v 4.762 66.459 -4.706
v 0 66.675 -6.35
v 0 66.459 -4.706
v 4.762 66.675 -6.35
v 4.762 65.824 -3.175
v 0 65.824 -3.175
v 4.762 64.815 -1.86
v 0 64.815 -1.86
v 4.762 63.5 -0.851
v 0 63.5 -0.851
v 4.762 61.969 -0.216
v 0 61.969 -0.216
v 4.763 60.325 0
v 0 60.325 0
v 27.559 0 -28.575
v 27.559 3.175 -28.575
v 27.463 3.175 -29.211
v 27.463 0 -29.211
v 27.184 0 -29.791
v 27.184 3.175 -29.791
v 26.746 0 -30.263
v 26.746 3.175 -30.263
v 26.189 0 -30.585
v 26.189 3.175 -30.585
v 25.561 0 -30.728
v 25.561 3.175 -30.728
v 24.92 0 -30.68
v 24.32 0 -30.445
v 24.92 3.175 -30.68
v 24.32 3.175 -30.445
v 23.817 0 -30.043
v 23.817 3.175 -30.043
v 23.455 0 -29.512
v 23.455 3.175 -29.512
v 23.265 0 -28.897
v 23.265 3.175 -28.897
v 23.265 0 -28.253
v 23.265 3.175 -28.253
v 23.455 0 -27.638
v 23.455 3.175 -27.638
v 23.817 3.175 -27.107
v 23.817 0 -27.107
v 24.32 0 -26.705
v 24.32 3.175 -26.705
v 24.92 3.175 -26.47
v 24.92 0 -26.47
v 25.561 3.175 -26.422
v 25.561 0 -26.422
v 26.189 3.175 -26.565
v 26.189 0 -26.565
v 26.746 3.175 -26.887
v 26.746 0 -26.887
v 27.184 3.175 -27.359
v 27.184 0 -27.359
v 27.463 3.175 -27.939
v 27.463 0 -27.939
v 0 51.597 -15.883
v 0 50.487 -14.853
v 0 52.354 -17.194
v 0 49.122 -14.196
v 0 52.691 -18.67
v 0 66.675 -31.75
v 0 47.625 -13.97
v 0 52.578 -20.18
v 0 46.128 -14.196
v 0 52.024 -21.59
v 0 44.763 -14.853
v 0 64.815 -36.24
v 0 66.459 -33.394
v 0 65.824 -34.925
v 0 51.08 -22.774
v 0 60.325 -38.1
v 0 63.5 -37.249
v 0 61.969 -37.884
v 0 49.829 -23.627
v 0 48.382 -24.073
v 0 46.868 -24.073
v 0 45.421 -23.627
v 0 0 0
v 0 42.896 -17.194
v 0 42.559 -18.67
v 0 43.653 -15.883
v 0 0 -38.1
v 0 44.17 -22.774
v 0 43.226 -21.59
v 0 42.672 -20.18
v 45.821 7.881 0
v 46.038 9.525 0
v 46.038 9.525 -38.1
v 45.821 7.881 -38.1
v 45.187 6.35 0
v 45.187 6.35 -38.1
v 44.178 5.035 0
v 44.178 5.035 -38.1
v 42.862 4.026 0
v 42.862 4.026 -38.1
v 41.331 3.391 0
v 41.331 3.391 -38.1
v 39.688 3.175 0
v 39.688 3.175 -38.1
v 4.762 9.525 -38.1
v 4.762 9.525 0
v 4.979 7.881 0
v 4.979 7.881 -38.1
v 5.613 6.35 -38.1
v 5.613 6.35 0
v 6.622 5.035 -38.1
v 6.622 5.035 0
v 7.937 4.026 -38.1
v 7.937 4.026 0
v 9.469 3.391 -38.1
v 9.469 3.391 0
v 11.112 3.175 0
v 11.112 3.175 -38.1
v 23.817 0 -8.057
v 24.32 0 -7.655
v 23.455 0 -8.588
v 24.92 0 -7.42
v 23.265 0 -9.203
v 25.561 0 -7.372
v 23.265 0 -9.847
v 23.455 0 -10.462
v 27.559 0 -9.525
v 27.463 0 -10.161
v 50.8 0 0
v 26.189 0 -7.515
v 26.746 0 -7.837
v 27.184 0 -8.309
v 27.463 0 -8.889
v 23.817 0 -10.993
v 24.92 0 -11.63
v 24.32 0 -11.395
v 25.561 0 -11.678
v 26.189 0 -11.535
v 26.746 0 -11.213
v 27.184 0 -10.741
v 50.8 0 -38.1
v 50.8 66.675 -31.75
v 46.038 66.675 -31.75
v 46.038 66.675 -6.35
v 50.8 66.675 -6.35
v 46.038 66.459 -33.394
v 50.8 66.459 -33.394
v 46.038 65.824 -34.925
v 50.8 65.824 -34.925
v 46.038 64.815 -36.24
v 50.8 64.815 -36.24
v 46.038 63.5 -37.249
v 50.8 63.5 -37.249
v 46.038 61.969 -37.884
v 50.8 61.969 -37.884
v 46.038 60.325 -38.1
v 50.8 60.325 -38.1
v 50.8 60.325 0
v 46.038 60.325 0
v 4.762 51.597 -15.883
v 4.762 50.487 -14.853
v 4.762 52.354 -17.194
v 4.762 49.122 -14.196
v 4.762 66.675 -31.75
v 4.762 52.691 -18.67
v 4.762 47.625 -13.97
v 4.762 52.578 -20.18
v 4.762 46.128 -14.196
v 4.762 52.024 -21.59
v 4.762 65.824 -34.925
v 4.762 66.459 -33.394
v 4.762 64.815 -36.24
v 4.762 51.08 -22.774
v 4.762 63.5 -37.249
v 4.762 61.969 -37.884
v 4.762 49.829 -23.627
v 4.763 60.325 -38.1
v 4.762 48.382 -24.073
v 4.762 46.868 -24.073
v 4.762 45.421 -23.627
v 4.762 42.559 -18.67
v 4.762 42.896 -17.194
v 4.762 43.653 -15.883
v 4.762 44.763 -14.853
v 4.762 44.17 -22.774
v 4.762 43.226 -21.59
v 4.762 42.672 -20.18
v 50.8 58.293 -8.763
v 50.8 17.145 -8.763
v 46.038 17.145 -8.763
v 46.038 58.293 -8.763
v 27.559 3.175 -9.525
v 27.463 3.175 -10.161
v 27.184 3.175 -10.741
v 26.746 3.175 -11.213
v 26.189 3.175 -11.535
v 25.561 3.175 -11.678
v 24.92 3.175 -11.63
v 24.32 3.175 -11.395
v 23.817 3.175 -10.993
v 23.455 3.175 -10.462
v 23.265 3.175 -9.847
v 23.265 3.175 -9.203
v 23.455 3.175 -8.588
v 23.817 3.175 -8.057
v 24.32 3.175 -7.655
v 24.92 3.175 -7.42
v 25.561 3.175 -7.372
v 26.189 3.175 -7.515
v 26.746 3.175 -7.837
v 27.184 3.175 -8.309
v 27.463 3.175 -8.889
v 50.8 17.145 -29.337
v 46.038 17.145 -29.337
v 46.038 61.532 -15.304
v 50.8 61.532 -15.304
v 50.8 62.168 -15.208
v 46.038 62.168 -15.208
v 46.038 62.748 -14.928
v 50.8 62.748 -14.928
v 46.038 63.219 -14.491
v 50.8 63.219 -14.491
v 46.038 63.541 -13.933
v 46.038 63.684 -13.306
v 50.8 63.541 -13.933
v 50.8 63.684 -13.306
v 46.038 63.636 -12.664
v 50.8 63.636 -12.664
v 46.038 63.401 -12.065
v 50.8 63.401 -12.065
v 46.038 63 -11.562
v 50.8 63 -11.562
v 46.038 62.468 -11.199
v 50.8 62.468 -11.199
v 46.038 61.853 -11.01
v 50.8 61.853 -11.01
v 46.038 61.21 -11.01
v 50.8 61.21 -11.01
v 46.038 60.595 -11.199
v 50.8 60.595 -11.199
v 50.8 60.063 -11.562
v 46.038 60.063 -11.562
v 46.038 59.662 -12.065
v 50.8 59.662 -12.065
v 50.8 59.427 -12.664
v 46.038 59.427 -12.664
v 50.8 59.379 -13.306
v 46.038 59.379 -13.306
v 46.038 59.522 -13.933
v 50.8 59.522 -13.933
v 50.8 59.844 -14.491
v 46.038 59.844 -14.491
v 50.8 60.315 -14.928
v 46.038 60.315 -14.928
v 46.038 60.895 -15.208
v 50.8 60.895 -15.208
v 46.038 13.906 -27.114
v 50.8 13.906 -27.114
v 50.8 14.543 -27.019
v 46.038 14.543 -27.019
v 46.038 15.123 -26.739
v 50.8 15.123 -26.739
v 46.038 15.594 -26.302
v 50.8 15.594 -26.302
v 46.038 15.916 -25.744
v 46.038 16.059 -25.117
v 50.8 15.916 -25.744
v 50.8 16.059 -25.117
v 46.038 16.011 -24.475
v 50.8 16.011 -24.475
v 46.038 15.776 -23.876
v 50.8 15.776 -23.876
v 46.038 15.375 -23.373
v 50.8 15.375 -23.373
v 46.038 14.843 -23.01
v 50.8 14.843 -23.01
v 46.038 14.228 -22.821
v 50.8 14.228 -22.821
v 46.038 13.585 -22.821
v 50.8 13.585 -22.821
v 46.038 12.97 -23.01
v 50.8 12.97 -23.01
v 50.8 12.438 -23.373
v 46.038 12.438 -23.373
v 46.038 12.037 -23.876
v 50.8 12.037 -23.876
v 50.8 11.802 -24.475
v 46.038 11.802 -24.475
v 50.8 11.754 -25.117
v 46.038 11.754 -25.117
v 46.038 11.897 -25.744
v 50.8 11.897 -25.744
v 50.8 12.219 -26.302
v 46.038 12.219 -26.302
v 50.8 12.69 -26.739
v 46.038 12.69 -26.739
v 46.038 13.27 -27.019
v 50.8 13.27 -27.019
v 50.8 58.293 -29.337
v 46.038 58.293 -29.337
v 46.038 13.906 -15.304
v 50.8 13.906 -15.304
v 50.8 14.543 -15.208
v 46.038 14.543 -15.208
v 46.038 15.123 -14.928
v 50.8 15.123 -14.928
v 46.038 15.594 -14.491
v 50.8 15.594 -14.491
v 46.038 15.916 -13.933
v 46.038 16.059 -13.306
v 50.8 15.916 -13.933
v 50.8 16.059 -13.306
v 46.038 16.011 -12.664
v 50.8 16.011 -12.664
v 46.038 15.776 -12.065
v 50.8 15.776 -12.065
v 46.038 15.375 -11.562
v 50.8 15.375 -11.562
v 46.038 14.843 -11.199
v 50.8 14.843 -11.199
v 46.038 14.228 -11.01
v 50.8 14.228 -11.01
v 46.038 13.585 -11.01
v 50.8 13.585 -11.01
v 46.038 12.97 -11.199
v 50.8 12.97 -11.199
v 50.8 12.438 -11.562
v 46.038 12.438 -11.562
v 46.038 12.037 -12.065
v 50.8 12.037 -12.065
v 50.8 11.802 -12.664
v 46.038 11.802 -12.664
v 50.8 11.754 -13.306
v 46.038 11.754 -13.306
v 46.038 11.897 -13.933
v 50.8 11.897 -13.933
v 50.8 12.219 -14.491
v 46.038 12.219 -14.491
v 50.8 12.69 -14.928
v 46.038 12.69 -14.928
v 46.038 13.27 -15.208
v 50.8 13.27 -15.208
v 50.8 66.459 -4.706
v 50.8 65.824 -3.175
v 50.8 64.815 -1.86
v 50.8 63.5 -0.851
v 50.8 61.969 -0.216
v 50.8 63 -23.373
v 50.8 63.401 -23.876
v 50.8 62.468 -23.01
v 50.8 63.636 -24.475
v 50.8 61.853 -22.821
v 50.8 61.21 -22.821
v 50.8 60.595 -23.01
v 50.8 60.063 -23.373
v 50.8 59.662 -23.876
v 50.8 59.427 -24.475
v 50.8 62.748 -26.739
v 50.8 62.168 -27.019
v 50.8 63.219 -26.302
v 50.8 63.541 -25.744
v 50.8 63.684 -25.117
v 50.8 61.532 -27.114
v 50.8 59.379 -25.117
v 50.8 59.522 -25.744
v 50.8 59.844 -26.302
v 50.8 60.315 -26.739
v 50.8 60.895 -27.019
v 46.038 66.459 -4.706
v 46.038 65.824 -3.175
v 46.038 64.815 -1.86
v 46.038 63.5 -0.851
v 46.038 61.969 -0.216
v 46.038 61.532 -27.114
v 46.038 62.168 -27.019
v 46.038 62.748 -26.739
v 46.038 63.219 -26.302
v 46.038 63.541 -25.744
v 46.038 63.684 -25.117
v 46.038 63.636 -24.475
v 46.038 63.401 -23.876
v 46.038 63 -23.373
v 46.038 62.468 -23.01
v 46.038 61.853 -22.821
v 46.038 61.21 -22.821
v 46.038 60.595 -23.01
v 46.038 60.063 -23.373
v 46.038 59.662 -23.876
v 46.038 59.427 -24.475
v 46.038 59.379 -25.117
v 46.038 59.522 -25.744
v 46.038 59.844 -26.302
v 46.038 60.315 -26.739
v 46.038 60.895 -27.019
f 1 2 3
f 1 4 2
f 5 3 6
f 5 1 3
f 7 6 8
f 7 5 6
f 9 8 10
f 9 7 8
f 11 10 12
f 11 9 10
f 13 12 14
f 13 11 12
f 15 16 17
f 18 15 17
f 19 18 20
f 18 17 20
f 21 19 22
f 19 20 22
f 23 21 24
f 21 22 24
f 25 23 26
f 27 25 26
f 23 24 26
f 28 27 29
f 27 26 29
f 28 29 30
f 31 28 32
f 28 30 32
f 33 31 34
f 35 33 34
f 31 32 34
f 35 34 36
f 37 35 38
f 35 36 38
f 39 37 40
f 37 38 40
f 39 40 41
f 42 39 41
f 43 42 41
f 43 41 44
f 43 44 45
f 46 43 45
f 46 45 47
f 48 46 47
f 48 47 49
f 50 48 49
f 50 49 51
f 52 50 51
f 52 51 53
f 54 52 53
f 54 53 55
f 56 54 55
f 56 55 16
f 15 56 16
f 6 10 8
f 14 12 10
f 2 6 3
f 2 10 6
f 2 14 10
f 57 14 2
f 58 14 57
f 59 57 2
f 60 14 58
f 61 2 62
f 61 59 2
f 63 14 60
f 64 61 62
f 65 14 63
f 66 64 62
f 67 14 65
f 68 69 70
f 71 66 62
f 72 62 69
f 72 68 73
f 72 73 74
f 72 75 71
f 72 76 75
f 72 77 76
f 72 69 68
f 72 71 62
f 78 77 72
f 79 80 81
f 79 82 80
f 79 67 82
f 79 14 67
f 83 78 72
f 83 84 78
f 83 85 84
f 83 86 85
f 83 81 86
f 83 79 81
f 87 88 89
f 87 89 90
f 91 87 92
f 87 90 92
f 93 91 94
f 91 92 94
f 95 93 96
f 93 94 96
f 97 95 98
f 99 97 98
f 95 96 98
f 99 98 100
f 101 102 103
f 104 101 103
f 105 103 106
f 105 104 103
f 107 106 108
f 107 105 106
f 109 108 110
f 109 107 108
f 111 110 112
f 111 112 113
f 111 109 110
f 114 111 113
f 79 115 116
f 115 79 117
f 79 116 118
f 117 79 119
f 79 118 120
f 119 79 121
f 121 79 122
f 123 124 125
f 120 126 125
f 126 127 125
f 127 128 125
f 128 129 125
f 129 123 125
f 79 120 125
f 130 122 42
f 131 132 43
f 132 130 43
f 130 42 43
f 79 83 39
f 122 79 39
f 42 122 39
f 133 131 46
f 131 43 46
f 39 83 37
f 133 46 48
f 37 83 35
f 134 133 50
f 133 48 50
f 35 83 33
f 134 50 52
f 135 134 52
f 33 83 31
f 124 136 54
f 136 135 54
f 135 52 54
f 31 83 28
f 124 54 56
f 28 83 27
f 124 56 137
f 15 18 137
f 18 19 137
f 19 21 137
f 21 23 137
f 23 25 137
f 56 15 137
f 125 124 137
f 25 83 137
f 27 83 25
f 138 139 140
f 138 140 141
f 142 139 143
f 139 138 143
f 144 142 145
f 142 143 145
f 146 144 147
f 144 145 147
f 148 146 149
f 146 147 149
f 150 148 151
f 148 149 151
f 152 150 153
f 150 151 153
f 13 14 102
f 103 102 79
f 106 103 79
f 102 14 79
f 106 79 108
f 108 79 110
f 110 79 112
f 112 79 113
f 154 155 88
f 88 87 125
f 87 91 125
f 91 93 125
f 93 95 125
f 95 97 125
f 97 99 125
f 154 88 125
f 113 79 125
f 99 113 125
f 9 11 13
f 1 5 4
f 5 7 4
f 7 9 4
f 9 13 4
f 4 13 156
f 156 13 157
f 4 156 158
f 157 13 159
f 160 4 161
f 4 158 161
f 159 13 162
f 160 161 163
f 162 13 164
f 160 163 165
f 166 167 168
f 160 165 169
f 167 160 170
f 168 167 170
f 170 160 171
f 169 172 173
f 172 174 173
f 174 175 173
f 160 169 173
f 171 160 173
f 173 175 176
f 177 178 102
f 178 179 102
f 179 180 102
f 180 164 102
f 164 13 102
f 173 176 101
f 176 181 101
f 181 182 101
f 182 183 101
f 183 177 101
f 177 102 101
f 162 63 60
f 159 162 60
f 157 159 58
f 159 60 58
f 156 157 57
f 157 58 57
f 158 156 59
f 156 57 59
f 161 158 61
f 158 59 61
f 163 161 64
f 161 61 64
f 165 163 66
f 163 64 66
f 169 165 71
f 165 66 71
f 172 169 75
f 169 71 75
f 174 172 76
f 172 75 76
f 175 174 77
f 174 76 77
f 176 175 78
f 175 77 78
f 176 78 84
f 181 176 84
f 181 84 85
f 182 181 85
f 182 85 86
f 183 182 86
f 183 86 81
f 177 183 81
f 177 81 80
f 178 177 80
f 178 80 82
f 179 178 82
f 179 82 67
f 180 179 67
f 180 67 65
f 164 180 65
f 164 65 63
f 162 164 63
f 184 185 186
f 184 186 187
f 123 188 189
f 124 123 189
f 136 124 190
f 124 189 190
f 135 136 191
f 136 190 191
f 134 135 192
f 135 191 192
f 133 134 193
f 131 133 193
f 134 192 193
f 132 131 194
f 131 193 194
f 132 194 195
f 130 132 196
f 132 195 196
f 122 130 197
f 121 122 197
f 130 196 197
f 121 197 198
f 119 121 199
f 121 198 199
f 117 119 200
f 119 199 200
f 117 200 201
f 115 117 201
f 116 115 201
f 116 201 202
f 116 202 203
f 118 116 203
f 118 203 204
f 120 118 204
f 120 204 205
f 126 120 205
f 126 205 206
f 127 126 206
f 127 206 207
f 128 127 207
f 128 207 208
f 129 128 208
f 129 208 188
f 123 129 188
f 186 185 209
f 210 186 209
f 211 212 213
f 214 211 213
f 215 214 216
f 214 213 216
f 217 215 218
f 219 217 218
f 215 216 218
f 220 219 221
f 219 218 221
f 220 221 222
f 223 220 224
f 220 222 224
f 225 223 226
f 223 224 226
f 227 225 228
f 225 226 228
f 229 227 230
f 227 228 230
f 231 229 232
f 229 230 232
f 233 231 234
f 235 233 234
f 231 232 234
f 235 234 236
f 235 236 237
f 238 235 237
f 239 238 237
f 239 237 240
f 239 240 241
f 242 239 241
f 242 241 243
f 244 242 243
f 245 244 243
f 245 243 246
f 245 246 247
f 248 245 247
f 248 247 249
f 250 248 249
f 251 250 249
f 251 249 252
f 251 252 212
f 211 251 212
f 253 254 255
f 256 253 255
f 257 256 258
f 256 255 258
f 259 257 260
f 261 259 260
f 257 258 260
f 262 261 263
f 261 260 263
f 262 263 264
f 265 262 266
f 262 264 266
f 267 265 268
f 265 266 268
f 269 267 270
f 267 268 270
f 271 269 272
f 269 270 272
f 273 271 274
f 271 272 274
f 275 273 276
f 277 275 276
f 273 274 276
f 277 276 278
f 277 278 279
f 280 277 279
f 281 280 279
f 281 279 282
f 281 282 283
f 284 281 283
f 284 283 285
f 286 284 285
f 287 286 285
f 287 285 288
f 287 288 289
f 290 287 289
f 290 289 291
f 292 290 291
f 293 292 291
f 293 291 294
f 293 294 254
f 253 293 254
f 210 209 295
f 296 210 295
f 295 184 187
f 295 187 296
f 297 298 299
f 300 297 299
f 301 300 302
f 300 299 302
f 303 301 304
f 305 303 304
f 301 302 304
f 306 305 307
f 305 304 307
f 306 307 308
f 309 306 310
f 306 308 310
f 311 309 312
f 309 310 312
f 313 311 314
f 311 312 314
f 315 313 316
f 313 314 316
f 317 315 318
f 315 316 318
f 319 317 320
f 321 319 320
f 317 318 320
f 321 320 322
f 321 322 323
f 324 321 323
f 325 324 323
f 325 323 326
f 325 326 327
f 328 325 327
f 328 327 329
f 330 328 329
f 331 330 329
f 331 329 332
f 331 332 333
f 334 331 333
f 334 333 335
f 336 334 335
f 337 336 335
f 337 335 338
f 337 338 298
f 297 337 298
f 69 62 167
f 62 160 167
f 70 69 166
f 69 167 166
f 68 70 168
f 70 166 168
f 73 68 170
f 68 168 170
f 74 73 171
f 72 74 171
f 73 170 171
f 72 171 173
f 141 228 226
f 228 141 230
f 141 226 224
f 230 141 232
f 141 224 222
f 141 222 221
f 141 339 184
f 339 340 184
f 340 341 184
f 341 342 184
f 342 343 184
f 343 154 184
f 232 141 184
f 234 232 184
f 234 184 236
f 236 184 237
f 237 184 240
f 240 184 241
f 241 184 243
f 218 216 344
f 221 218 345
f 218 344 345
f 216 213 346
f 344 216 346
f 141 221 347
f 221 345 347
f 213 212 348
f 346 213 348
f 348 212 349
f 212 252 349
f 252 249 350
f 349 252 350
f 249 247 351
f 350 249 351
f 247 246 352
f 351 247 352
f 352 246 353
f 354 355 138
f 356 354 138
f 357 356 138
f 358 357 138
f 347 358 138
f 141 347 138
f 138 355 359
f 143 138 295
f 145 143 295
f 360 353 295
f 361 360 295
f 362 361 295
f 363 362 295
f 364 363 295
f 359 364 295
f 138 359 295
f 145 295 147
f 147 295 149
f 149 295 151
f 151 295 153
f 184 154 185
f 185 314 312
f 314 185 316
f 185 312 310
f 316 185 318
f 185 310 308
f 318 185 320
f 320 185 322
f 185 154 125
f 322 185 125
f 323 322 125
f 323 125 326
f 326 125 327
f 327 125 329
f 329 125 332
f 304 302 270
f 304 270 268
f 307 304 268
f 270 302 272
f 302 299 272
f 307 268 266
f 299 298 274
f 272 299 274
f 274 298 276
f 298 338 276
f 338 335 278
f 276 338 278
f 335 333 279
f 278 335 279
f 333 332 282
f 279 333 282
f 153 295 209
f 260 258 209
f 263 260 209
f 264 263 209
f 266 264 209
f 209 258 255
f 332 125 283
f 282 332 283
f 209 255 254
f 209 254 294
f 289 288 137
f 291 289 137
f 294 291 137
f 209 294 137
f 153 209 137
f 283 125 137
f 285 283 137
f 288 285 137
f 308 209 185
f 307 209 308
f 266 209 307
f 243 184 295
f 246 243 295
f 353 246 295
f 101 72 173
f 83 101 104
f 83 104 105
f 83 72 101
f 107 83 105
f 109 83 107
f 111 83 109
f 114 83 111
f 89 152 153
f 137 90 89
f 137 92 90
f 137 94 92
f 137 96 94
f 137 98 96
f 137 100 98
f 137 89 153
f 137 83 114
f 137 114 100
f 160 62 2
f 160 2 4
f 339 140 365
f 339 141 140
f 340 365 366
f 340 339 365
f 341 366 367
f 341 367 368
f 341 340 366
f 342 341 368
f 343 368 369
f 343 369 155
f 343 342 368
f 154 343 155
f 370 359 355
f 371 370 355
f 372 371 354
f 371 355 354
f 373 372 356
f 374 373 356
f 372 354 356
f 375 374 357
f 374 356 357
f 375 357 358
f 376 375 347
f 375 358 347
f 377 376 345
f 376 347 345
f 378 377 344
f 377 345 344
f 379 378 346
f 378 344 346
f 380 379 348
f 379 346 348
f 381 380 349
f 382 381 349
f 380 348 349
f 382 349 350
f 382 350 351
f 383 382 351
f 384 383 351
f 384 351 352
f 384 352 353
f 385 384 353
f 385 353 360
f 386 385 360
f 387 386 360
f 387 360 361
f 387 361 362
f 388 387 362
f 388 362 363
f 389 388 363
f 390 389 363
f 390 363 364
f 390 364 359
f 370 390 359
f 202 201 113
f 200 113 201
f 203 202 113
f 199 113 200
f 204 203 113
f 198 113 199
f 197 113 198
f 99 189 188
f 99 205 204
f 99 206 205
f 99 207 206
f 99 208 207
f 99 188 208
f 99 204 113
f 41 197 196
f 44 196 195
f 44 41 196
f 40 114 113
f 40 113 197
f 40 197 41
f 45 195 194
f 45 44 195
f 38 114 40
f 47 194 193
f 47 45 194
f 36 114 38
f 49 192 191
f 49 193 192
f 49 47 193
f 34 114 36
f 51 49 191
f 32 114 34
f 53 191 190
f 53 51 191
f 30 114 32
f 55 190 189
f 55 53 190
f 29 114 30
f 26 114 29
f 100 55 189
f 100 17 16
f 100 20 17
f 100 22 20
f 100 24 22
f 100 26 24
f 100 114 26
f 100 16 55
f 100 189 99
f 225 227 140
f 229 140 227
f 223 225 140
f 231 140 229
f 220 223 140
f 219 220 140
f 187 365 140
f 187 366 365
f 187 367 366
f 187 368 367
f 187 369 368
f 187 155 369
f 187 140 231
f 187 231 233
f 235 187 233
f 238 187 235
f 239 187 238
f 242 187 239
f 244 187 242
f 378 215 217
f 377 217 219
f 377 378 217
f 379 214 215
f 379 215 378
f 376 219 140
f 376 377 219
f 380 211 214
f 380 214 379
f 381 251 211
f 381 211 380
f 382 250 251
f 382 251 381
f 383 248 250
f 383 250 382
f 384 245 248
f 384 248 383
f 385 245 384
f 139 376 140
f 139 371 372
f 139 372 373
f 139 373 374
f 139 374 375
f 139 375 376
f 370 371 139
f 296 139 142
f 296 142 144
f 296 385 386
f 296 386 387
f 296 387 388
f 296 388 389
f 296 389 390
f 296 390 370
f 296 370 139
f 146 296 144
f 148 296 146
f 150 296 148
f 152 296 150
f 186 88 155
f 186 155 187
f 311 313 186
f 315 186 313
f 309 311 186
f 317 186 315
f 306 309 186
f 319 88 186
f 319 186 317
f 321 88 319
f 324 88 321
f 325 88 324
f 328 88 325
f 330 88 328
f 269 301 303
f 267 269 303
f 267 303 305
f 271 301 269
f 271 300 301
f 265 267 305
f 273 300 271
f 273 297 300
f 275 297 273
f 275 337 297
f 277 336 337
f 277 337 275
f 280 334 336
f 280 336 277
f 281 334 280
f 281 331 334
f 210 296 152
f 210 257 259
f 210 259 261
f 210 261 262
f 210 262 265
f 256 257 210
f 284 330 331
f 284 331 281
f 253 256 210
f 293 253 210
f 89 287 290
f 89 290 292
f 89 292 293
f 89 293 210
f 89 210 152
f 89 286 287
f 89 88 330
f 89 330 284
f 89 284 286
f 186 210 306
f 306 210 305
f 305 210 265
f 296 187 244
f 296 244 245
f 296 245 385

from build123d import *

# Parameters (mm, degrees)
SKETCH1_W           = 50.8
SKETCH1_H           = 38.1
BOSS_EXTRUDE1_DEPTH = 3.175
SKETCH2_W           = 4.7625
SKETCH2_H           = 38.1
BOSS_EXTRUDE2_DEPTH = 63.5
FILLET1_R           = 6.35
CUT_EXTRUDE1_REACH  = 52.8
SKETCH3_R           = 2.159
SKETCH3_W           = 20.574
SKETCH3_H           = 41.148
CUT_EXTRUDE2_REACH  = 5.175
SKETCH4_R           = 2.159
CUT_EXTRUDE3_REACH  = 52.8
SKETCH5_R           = 5.08


with BuildPart() as part:
    # Sketch1 → Boss-Extrude1 (new body)
    with BuildSketch(Plane(origin=(0, 0, 0), x_dir=(1, 0, 0), z_dir=(0, 1, 0))):
        with Locations((25.4, 19.05)):
            Rectangle(SKETCH1_W, SKETCH1_H)
    extrude(amount=BOSS_EXTRUDE1_DEPTH)

    # Sketch2 → Boss-Extrude2 (add)
    with BuildSketch(Plane(origin=(0, 3.175, 0), x_dir=(1, 0, 0), z_dir=(0, 1, 0))):
        with Locations((48.41875, 19.05)):
            Rectangle(SKETCH2_W, SKETCH2_H)
        with Locations((2.38125, 19.05)):
            Rectangle(SKETCH2_W, SKETCH2_H)
    extrude(amount=BOSS_EXTRUDE2_DEPTH)

    # Fillet1
    fillet1_edges = [part.edges().sort_by_distance(p)[0] for p in [
        (46.0375, 3.175, -19.05),
        (48.41875, 66.675, -38.1),
        (48.41875, 66.675, 0),
        (4.7625, 3.175, -19.05),
        (2.38125, 66.675, -38.1),
        (2.38125, 66.675, 0),
    ]]
    fillet(fillet1_edges, radius=FILLET1_R)

    # Sketch3 → Cut-Extrude1 (cut, up to next)
    with BuildSketch(Plane(origin=(50.8, 0, 0), x_dir=(0, 0, -1), z_dir=(1, 0, 0)), mode=Mode.PRIVATE) as cut_extrude1_sk1:
        with Locations((24.9555, 61.5315)):
            Circle(SKETCH3_R)
    cut_extrude1_tool1 = extrude(cut_extrude1_sk1.sketch, amount=-CUT_EXTRUDE1_REACH, mode=Mode.PRIVATE) & part.part
    add(cut_extrude1_tool1.solids().sort_by_distance((50.8, 61.5315, -24.9555))[0], mode=Mode.SUBTRACT)
    # Sketch3 → Cut-Extrude1 (cut, up to next)
    with BuildSketch(Plane(origin=(50.8, 0, 0), x_dir=(0, 0, -1), z_dir=(1, 0, 0)), mode=Mode.PRIVATE) as cut_extrude1_sk2:
        with Locations((13.1445, 61.5315)):
            Circle(SKETCH3_R)
    cut_extrude1_tool2 = extrude(cut_extrude1_sk2.sketch, amount=-CUT_EXTRUDE1_REACH, mode=Mode.PRIVATE) & part.part
    add(cut_extrude1_tool2.solids().sort_by_distance((50.8, 61.5315, -13.1445))[0], mode=Mode.SUBTRACT)
    # Sketch3 → Cut-Extrude1 (cut, up to next)
    with BuildSketch(Plane(origin=(50.8, 0, 0), x_dir=(0, 0, -1), z_dir=(1, 0, 0)), mode=Mode.PRIVATE) as cut_extrude1_sk3:
        with Locations((13.1445, 13.9065)):
            Circle(SKETCH3_R)
    cut_extrude1_tool3 = extrude(cut_extrude1_sk3.sketch, amount=-CUT_EXTRUDE1_REACH, mode=Mode.PRIVATE) & part.part
    add(cut_extrude1_tool3.solids().sort_by_distance((50.8, 13.9065, -13.1445))[0], mode=Mode.SUBTRACT)
    # Sketch3 → Cut-Extrude1 (cut, up to next)
    with BuildSketch(Plane(origin=(50.8, 0, 0), x_dir=(0, 0, -1), z_dir=(1, 0, 0)), mode=Mode.PRIVATE) as cut_extrude1_sk4:
        with Locations((24.9555, 13.9065)):
            Circle(SKETCH3_R)
    cut_extrude1_tool4 = extrude(cut_extrude1_sk4.sketch, amount=-CUT_EXTRUDE1_REACH, mode=Mode.PRIVATE) & part.part
    add(cut_extrude1_tool4.solids().sort_by_distance((50.8, 13.9065, -24.9555))[0], mode=Mode.SUBTRACT)
    # Sketch3 → Cut-Extrude1 (cut, up to next)
    with BuildSketch(Plane(origin=(50.8, 0, 0), x_dir=(0, 0, -1), z_dir=(1, 0, 0)), mode=Mode.PRIVATE) as cut_extrude1_sk5:
        with Locations((19.05, 37.719)):
            Rectangle(SKETCH3_W, SKETCH3_H)
    cut_extrude1_tool5 = extrude(cut_extrude1_sk5.sketch, amount=-CUT_EXTRUDE1_REACH, mode=Mode.PRIVATE) & part.part
    add(cut_extrude1_tool5.solids().sort_by_distance((50.8, 37.719, -19.05))[0], mode=Mode.SUBTRACT)

    # Sketch4 → Cut-Extrude2 (cut, up to next)
    with BuildSketch(Plane(origin=(0, 3.175, 0), x_dir=(1, 0, 0), z_dir=(0, 1, 0)), mode=Mode.PRIVATE) as cut_extrude2_sk1:
        with Locations((25.4, 28.575)):
            Circle(SKETCH4_R)
    cut_extrude2_tool1 = extrude(cut_extrude2_sk1.sketch, amount=-CUT_EXTRUDE2_REACH, mode=Mode.PRIVATE) & part.part
    add(cut_extrude2_tool1.solids().sort_by_distance((25.4, 3.175, -28.575))[0], mode=Mode.SUBTRACT)
    # Sketch4 → Cut-Extrude2 (cut, up to next)
    with BuildSketch(Plane(origin=(0, 3.175, 0), x_dir=(1, 0, 0), z_dir=(0, 1, 0)), mode=Mode.PRIVATE) as cut_extrude2_sk2:
        with Locations((25.4, 9.525)):
            Circle(SKETCH4_R)
    cut_extrude2_tool2 = extrude(cut_extrude2_sk2.sketch, amount=-CUT_EXTRUDE2_REACH, mode=Mode.PRIVATE) & part.part
    add(cut_extrude2_tool2.solids().sort_by_distance((25.4, 3.175, -9.525))[0], mode=Mode.SUBTRACT)

    # Sketch5 → Cut-Extrude3 (cut, up to next)
    with BuildSketch(Plane.ZY, mode=Mode.PRIVATE) as cut_extrude3_sk1:
        with Locations((-19.05, 47.625)):
            Circle(SKETCH5_R)
    cut_extrude3_tool1 = extrude(cut_extrude3_sk1.sketch, amount=-CUT_EXTRUDE3_REACH, mode=Mode.PRIVATE) & part.part
    add(cut_extrude3_tool1.solids().sort_by_distance((0, 47.625, -19.05))[0], mode=Mode.SUBTRACT)


solid = part.part
